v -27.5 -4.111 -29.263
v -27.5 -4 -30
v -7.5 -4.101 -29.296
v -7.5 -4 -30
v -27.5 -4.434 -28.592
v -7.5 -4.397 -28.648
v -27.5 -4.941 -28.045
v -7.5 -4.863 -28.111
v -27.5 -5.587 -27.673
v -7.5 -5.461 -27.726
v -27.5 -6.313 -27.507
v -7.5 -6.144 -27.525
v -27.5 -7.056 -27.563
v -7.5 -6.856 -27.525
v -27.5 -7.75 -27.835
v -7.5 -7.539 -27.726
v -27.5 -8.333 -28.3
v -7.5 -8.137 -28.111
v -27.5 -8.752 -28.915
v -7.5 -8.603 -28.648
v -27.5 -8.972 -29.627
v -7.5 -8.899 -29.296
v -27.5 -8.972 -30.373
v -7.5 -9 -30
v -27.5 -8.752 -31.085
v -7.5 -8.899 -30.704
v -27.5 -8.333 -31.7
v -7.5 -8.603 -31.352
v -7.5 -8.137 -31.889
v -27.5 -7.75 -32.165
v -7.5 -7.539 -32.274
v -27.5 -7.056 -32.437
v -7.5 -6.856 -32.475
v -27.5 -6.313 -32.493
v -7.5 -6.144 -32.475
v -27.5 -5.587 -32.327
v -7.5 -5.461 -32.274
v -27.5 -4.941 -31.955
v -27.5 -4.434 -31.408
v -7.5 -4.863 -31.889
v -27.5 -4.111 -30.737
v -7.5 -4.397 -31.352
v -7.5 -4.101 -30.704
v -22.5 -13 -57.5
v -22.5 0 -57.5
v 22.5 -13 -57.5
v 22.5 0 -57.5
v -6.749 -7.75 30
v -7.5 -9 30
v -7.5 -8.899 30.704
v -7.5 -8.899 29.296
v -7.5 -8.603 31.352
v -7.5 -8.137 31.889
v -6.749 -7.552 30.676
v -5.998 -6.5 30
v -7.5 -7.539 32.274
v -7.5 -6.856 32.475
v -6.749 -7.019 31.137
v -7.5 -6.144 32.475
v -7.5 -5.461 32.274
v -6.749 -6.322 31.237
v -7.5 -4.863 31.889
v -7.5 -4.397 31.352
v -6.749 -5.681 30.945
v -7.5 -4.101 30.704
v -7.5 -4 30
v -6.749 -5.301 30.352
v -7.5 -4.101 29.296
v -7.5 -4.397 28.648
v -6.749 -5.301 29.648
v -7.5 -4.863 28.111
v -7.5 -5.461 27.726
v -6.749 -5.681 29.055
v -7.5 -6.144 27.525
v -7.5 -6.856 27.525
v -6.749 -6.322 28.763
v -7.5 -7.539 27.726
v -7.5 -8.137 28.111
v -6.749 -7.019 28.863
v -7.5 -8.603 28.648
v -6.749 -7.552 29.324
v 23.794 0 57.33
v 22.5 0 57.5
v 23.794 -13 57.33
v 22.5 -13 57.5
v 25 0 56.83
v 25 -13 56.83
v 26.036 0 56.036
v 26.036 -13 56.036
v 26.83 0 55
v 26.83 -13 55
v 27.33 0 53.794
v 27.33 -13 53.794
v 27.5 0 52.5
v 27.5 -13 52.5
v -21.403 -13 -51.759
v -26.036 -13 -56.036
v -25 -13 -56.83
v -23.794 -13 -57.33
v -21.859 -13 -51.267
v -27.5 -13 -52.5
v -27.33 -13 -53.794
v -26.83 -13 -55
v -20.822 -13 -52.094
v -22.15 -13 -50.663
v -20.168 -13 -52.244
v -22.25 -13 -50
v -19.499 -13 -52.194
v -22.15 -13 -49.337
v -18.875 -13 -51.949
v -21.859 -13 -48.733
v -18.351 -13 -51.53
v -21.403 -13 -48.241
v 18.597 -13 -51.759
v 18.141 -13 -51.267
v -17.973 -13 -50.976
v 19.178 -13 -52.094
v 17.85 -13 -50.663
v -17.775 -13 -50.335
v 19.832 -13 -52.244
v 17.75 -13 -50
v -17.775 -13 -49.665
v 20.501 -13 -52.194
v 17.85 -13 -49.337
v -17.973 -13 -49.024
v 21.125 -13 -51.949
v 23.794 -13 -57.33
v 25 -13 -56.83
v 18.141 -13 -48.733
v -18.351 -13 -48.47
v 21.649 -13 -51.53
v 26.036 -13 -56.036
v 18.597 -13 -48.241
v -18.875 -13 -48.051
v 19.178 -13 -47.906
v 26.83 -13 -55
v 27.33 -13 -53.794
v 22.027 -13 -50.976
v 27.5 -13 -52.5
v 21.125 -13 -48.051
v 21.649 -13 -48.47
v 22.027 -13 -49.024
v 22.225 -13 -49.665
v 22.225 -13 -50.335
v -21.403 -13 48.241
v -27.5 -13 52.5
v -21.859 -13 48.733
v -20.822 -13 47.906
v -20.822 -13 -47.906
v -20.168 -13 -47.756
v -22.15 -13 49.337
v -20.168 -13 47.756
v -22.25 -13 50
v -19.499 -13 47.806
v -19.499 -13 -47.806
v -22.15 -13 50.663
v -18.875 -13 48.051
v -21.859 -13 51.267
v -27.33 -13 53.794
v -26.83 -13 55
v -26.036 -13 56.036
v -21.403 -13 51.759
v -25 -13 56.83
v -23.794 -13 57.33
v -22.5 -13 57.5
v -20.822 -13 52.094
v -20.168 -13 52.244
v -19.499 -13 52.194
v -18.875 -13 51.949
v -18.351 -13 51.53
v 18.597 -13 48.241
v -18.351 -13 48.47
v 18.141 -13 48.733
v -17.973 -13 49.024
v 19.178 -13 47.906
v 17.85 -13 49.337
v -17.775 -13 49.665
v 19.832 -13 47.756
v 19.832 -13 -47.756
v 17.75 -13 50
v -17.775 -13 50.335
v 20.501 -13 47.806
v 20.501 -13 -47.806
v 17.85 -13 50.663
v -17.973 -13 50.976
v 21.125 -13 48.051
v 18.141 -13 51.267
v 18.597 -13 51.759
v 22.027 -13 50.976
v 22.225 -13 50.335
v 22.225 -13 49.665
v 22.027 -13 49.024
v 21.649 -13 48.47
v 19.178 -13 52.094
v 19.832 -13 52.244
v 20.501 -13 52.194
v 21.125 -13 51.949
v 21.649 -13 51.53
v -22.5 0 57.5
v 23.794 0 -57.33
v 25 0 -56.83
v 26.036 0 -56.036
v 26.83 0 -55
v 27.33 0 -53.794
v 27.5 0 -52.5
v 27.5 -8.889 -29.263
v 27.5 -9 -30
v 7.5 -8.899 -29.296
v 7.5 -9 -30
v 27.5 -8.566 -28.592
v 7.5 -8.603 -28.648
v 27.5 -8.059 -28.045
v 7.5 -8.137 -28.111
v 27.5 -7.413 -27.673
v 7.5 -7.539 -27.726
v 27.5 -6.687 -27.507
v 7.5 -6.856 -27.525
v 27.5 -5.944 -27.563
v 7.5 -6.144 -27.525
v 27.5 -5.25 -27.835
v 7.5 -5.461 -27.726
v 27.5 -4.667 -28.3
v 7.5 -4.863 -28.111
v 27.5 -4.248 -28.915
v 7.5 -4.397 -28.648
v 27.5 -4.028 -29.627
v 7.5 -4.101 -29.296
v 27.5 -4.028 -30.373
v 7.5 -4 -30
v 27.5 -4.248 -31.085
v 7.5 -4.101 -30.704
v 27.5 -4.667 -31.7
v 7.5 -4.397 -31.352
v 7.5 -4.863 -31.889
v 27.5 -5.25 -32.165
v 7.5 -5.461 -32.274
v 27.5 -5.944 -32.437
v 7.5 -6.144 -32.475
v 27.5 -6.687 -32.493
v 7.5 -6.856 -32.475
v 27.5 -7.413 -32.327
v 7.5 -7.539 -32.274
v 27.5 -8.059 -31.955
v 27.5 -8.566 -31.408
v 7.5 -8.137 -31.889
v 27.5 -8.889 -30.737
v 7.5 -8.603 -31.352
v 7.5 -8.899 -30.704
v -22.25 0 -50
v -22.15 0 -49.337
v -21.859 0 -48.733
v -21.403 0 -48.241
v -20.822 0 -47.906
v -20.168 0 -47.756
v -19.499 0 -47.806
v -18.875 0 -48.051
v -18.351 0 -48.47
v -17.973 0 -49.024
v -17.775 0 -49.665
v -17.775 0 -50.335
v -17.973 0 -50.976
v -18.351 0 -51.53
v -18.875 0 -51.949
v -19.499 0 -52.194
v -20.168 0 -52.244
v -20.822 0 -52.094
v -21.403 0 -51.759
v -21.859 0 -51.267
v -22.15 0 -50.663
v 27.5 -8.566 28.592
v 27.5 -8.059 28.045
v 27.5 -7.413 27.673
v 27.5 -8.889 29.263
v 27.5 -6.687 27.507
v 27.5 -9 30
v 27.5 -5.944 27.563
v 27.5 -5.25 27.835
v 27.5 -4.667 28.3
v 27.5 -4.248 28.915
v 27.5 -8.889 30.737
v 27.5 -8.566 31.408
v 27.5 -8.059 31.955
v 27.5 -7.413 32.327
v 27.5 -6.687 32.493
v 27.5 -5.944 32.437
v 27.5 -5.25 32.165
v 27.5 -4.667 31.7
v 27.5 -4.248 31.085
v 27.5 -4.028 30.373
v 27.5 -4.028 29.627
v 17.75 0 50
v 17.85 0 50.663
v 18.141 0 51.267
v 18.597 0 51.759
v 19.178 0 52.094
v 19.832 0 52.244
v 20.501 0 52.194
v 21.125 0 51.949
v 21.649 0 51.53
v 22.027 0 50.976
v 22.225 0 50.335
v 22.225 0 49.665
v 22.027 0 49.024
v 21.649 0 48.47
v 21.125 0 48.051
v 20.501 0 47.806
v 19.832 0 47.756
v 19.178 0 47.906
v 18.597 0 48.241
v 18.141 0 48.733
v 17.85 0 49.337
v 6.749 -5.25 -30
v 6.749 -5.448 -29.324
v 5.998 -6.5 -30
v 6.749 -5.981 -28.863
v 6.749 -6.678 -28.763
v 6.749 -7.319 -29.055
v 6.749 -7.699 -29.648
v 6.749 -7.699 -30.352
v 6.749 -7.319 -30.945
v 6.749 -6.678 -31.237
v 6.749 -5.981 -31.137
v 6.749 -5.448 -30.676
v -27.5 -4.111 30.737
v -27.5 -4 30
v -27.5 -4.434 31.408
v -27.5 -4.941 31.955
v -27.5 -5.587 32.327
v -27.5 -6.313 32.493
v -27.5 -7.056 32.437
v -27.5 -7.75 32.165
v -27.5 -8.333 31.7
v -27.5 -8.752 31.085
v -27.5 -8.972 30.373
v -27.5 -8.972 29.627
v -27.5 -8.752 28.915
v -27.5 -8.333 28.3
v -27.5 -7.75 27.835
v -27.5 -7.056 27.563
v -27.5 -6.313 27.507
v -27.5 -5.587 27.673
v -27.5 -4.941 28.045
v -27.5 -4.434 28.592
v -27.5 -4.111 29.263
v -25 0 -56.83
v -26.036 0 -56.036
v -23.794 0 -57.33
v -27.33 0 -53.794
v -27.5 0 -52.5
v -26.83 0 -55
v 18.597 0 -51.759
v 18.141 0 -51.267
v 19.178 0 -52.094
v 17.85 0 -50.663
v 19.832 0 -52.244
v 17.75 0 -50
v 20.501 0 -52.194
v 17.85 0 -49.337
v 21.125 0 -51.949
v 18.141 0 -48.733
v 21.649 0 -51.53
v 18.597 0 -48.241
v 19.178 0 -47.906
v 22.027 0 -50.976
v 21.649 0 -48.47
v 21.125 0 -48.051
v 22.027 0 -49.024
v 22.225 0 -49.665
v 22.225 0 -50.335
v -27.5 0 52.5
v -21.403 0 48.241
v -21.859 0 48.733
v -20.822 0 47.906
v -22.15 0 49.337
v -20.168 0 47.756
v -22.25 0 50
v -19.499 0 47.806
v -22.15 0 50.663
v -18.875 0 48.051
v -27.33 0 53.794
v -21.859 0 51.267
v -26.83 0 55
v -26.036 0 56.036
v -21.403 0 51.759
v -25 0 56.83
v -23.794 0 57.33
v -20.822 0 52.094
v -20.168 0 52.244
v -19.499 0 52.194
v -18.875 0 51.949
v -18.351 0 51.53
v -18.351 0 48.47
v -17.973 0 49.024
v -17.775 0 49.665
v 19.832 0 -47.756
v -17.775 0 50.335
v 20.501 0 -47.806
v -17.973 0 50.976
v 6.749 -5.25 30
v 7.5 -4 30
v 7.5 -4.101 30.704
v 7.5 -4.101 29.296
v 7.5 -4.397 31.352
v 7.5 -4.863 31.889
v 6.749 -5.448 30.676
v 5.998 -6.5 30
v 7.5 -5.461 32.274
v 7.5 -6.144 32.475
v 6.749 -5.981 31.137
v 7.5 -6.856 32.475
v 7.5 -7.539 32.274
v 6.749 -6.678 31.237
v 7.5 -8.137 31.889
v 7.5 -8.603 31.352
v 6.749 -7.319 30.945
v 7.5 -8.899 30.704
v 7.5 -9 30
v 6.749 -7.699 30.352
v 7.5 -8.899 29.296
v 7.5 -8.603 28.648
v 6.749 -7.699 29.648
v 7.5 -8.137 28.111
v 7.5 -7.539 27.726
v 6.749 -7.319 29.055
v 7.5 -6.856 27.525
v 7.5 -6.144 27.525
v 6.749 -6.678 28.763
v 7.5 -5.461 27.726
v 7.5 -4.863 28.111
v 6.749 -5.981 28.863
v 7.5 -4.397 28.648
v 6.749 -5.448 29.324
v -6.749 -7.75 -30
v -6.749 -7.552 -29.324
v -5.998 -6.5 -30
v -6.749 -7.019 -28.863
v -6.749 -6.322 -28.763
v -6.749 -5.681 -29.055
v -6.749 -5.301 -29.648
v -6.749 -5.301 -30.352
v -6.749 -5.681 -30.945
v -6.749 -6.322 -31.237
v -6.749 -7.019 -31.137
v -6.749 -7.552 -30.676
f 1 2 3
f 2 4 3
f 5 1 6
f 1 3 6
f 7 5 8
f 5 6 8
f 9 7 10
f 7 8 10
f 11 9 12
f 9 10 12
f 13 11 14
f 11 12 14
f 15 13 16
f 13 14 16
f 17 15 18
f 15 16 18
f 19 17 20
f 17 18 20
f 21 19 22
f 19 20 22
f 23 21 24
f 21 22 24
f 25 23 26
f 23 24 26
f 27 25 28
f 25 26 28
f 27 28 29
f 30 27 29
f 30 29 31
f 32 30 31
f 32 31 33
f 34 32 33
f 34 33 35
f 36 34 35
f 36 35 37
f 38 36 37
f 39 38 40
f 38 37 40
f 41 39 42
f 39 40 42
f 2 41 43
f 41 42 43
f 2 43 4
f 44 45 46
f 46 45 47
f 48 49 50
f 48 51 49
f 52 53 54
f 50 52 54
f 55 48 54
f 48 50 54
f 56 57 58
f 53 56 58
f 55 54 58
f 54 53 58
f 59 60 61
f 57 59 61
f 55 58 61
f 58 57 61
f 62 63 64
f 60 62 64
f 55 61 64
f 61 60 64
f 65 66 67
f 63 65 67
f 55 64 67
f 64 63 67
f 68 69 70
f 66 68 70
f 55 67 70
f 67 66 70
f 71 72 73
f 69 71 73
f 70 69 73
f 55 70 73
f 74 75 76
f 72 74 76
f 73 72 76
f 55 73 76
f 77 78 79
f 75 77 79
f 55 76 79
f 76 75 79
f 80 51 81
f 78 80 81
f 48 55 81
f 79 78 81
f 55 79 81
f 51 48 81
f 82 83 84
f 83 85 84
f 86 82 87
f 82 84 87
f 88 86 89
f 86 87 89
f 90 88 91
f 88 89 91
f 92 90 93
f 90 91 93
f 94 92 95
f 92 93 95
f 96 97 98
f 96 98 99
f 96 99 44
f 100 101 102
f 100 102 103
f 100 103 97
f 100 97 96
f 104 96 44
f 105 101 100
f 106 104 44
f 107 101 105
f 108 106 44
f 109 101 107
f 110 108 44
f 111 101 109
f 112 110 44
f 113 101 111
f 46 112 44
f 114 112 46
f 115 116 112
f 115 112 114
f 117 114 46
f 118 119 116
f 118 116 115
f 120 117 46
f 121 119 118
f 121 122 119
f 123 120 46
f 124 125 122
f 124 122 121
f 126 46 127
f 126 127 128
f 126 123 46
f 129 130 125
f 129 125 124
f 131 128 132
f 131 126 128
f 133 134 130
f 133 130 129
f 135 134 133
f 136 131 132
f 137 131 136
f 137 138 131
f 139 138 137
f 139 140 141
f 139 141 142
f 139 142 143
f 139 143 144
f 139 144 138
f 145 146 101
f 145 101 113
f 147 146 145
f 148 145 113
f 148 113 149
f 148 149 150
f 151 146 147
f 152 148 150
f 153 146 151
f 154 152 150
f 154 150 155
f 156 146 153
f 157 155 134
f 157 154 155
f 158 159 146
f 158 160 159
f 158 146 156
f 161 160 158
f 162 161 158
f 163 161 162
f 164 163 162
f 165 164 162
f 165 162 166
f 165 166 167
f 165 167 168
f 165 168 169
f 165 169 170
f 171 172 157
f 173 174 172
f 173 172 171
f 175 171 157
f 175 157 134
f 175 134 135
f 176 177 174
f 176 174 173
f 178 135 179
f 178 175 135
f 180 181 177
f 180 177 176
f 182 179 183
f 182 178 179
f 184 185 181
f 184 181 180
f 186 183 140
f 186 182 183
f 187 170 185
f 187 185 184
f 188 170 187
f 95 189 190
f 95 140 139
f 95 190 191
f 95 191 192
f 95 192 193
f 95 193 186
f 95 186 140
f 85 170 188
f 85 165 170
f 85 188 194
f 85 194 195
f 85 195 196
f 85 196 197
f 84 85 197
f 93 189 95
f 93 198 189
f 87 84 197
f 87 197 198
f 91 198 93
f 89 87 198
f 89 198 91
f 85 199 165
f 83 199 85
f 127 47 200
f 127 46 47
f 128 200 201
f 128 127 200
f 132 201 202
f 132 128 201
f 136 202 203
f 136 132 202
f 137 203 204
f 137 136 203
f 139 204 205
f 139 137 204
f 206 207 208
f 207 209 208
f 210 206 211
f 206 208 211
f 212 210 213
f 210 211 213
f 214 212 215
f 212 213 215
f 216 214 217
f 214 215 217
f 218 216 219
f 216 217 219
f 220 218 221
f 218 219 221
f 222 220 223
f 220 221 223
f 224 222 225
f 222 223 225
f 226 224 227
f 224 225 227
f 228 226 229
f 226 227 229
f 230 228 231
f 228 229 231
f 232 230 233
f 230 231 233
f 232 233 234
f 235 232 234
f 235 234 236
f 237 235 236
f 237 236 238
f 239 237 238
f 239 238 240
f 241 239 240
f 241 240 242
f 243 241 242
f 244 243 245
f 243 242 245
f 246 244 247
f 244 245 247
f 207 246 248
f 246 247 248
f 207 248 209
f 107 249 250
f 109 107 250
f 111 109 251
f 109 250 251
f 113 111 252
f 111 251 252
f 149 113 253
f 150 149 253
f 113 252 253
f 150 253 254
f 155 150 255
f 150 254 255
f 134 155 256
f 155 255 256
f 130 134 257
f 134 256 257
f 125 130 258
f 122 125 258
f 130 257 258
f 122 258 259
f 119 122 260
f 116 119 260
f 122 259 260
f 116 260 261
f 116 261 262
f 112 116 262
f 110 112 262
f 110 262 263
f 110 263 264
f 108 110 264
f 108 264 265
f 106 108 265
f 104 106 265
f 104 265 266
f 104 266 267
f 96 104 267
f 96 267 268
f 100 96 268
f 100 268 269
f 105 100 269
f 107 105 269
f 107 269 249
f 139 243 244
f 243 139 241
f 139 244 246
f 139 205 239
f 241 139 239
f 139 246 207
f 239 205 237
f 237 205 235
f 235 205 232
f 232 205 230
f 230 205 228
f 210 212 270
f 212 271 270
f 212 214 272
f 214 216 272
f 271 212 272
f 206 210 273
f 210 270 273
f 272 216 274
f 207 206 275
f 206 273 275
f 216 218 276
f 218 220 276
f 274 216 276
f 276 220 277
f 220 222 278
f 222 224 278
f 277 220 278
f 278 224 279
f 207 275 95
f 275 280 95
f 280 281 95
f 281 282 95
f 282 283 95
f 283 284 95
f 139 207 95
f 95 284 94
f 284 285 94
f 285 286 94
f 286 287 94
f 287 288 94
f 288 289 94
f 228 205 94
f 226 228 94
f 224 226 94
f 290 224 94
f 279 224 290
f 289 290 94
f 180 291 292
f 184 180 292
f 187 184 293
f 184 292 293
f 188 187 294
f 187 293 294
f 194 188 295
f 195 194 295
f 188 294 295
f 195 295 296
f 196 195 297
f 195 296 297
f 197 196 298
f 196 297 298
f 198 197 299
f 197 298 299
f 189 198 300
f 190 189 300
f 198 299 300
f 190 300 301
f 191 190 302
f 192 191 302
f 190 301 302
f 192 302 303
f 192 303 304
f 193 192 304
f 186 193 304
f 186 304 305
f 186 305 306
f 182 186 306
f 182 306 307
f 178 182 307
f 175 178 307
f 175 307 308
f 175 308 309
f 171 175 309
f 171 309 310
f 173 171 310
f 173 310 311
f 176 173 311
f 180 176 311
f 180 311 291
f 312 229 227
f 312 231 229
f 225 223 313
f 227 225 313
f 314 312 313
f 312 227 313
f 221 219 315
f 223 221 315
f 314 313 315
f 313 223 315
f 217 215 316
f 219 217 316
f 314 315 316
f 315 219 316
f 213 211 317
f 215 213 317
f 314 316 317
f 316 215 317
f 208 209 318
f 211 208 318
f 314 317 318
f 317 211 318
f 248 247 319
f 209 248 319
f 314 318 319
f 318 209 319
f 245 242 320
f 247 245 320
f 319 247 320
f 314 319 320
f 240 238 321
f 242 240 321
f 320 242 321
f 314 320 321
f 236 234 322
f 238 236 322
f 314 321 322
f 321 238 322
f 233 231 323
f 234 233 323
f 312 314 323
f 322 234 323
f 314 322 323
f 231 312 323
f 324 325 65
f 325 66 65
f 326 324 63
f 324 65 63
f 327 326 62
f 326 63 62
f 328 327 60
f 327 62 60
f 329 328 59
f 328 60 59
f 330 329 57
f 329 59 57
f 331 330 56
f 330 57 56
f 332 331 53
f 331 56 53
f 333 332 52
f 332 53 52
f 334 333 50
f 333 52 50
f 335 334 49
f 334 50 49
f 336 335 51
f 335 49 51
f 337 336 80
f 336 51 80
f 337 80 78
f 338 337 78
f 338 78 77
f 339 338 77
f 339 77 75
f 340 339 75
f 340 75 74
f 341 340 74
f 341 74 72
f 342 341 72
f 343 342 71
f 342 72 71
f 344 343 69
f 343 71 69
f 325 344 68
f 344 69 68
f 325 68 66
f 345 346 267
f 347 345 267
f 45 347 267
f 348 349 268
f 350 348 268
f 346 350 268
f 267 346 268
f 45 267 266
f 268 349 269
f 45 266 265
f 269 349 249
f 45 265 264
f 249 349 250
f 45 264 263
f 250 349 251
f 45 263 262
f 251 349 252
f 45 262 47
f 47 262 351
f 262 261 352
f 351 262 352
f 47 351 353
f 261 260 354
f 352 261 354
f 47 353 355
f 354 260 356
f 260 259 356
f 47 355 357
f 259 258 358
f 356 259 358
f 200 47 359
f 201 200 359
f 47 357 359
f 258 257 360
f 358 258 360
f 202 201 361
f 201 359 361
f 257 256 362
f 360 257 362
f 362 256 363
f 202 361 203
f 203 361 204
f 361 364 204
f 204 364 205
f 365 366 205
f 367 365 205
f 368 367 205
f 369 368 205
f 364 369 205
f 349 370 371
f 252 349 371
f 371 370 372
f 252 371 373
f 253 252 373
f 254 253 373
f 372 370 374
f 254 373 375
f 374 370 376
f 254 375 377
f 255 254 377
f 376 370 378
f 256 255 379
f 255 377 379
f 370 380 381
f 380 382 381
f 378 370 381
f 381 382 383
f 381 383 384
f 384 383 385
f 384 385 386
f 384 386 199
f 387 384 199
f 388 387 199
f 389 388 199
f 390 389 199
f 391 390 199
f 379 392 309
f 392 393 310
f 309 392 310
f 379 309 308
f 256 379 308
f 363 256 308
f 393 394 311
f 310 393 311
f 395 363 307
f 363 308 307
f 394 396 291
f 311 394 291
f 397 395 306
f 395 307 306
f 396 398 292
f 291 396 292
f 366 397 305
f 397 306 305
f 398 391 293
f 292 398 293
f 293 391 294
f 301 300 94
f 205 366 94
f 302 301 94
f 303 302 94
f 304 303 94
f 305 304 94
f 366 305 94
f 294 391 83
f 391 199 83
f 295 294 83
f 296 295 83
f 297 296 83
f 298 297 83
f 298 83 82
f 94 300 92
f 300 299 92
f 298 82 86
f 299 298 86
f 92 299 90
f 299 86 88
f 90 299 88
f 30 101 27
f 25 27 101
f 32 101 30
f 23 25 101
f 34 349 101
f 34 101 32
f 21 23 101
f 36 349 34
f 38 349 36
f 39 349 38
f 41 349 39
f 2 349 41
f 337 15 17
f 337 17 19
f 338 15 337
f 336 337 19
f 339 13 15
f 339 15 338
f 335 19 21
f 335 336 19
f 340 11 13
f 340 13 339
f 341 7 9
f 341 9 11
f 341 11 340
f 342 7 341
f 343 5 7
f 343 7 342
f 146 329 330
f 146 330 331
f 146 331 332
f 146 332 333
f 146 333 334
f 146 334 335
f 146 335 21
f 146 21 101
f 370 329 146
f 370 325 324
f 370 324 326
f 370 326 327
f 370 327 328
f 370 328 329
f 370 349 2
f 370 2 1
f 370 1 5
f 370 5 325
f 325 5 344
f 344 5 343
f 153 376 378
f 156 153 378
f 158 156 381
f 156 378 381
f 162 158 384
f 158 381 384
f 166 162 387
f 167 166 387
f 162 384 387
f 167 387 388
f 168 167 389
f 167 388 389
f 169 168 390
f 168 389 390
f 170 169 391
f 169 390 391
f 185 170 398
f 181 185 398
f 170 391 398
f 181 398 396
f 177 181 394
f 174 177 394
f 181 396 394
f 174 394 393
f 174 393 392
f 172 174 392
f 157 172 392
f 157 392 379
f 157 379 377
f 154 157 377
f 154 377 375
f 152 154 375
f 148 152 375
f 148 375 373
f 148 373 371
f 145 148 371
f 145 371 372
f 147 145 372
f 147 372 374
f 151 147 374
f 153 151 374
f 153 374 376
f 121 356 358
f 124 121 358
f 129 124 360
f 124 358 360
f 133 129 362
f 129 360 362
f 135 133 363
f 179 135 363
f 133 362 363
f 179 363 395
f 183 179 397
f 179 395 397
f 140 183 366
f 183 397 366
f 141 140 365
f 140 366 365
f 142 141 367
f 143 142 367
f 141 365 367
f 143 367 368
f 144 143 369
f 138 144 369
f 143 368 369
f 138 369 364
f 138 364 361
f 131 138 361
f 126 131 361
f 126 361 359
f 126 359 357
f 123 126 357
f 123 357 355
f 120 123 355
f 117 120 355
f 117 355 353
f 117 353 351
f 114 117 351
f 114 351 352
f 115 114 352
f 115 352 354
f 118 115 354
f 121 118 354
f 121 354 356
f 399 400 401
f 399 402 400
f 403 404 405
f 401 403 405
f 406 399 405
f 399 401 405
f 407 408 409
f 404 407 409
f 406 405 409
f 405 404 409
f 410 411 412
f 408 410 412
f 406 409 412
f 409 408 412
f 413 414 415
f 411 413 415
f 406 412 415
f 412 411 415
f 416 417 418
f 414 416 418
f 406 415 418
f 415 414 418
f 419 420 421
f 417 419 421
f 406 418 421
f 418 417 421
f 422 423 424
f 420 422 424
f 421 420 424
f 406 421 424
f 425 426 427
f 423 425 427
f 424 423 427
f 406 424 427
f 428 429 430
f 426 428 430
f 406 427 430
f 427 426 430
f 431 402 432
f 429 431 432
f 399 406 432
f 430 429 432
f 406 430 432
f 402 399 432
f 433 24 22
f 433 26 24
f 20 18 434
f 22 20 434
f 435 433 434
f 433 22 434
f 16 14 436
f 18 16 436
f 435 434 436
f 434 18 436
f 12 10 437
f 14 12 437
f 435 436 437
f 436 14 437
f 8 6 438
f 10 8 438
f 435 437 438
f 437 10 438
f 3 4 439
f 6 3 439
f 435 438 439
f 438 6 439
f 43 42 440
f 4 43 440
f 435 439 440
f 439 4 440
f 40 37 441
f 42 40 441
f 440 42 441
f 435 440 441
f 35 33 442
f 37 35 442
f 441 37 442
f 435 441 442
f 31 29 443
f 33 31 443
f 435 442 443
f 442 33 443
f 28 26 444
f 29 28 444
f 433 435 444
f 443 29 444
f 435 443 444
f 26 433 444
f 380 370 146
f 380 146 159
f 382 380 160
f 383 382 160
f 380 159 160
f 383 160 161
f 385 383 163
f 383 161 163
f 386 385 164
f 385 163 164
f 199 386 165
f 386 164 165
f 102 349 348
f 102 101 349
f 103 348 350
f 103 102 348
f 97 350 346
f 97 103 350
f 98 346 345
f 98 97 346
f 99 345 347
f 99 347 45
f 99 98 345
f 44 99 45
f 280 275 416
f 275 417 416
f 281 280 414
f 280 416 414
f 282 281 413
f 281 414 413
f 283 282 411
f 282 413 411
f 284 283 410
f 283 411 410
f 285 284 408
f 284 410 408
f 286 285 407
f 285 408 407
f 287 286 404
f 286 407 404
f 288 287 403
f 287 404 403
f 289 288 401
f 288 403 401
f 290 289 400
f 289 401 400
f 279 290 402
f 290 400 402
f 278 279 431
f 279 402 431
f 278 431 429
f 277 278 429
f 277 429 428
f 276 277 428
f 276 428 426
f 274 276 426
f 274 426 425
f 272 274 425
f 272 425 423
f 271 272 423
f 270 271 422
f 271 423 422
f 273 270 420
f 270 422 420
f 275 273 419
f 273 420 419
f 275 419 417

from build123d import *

# Parameters (mm, degrees)
F0_W     = 55
F0_H     = 115
F1_DEPTH = 13
F3_D     = 4.5
F3_DEPTH = 30
F3_TIP   = 1.3519363928
F5_D     = 5
F5_DEPTH = 20
F5_TIP   = 1.5021515476
F7_D     = 5
F7_DEPTH = 20
F7_TIP   = 1.5021515476
F8_R     = 5


with BuildPart() as f1:
    # F0 (on Front) → F1 (new body)
    with BuildSketch(Plane.XZ):
        Rectangle(F0_W, F0_H)
    extrude(amount=F1_DEPTH)

    # F3
    with Locations(Plane.XZ.offset(13)):
        with Locations((-20, 50), (20, 50), (20, -50), (-20, -50)):
            Hole(F3_D / 2, depth=F3_DEPTH)
            with Locations((0, 0, -(F3_DEPTH + F3_TIP / 2))):  # 118° drill point
                Cone(0, F3_D / 2, F3_TIP, mode=Mode.SUBTRACT)

    # F5
    with Locations(Plane.YZ.offset(27.5)):
        with Locations((-6.5, 30), (-6.5, -30)):
            Hole(F5_D / 2, depth=F5_DEPTH)
            with Locations((0, 0, -(F5_DEPTH + F5_TIP / 2))):  # 118° drill point
                Cone(0, F5_D / 2, F5_TIP, mode=Mode.SUBTRACT)

    # F7
    with Locations(Plane(origin=(-27.5, 0, 0), x_dir=(0, -1, 0), z_dir=(-1, 0, 0))):
        with Locations((6.5, 30), (6.5, -30)):
            Hole(F7_D / 2, depth=F7_DEPTH)
            with Locations((0, 0, -(F7_DEPTH + F7_TIP / 2))):  # 118° drill point
                Cone(0, F7_D / 2, F7_TIP, mode=Mode.SUBTRACT)

    # F8
    f8_edges = [f1.edges().sort_by_distance(p)[0] for p in [
        (27.5, -6.5, 57.5),
        (-27.5, -6.5, 57.5),
        (-27.5, -6.5, -57.5),
        (27.5, -6.5, -57.5),
    ]]
    fillet(f8_edges, radius=F8_R)


solid = f1.part
